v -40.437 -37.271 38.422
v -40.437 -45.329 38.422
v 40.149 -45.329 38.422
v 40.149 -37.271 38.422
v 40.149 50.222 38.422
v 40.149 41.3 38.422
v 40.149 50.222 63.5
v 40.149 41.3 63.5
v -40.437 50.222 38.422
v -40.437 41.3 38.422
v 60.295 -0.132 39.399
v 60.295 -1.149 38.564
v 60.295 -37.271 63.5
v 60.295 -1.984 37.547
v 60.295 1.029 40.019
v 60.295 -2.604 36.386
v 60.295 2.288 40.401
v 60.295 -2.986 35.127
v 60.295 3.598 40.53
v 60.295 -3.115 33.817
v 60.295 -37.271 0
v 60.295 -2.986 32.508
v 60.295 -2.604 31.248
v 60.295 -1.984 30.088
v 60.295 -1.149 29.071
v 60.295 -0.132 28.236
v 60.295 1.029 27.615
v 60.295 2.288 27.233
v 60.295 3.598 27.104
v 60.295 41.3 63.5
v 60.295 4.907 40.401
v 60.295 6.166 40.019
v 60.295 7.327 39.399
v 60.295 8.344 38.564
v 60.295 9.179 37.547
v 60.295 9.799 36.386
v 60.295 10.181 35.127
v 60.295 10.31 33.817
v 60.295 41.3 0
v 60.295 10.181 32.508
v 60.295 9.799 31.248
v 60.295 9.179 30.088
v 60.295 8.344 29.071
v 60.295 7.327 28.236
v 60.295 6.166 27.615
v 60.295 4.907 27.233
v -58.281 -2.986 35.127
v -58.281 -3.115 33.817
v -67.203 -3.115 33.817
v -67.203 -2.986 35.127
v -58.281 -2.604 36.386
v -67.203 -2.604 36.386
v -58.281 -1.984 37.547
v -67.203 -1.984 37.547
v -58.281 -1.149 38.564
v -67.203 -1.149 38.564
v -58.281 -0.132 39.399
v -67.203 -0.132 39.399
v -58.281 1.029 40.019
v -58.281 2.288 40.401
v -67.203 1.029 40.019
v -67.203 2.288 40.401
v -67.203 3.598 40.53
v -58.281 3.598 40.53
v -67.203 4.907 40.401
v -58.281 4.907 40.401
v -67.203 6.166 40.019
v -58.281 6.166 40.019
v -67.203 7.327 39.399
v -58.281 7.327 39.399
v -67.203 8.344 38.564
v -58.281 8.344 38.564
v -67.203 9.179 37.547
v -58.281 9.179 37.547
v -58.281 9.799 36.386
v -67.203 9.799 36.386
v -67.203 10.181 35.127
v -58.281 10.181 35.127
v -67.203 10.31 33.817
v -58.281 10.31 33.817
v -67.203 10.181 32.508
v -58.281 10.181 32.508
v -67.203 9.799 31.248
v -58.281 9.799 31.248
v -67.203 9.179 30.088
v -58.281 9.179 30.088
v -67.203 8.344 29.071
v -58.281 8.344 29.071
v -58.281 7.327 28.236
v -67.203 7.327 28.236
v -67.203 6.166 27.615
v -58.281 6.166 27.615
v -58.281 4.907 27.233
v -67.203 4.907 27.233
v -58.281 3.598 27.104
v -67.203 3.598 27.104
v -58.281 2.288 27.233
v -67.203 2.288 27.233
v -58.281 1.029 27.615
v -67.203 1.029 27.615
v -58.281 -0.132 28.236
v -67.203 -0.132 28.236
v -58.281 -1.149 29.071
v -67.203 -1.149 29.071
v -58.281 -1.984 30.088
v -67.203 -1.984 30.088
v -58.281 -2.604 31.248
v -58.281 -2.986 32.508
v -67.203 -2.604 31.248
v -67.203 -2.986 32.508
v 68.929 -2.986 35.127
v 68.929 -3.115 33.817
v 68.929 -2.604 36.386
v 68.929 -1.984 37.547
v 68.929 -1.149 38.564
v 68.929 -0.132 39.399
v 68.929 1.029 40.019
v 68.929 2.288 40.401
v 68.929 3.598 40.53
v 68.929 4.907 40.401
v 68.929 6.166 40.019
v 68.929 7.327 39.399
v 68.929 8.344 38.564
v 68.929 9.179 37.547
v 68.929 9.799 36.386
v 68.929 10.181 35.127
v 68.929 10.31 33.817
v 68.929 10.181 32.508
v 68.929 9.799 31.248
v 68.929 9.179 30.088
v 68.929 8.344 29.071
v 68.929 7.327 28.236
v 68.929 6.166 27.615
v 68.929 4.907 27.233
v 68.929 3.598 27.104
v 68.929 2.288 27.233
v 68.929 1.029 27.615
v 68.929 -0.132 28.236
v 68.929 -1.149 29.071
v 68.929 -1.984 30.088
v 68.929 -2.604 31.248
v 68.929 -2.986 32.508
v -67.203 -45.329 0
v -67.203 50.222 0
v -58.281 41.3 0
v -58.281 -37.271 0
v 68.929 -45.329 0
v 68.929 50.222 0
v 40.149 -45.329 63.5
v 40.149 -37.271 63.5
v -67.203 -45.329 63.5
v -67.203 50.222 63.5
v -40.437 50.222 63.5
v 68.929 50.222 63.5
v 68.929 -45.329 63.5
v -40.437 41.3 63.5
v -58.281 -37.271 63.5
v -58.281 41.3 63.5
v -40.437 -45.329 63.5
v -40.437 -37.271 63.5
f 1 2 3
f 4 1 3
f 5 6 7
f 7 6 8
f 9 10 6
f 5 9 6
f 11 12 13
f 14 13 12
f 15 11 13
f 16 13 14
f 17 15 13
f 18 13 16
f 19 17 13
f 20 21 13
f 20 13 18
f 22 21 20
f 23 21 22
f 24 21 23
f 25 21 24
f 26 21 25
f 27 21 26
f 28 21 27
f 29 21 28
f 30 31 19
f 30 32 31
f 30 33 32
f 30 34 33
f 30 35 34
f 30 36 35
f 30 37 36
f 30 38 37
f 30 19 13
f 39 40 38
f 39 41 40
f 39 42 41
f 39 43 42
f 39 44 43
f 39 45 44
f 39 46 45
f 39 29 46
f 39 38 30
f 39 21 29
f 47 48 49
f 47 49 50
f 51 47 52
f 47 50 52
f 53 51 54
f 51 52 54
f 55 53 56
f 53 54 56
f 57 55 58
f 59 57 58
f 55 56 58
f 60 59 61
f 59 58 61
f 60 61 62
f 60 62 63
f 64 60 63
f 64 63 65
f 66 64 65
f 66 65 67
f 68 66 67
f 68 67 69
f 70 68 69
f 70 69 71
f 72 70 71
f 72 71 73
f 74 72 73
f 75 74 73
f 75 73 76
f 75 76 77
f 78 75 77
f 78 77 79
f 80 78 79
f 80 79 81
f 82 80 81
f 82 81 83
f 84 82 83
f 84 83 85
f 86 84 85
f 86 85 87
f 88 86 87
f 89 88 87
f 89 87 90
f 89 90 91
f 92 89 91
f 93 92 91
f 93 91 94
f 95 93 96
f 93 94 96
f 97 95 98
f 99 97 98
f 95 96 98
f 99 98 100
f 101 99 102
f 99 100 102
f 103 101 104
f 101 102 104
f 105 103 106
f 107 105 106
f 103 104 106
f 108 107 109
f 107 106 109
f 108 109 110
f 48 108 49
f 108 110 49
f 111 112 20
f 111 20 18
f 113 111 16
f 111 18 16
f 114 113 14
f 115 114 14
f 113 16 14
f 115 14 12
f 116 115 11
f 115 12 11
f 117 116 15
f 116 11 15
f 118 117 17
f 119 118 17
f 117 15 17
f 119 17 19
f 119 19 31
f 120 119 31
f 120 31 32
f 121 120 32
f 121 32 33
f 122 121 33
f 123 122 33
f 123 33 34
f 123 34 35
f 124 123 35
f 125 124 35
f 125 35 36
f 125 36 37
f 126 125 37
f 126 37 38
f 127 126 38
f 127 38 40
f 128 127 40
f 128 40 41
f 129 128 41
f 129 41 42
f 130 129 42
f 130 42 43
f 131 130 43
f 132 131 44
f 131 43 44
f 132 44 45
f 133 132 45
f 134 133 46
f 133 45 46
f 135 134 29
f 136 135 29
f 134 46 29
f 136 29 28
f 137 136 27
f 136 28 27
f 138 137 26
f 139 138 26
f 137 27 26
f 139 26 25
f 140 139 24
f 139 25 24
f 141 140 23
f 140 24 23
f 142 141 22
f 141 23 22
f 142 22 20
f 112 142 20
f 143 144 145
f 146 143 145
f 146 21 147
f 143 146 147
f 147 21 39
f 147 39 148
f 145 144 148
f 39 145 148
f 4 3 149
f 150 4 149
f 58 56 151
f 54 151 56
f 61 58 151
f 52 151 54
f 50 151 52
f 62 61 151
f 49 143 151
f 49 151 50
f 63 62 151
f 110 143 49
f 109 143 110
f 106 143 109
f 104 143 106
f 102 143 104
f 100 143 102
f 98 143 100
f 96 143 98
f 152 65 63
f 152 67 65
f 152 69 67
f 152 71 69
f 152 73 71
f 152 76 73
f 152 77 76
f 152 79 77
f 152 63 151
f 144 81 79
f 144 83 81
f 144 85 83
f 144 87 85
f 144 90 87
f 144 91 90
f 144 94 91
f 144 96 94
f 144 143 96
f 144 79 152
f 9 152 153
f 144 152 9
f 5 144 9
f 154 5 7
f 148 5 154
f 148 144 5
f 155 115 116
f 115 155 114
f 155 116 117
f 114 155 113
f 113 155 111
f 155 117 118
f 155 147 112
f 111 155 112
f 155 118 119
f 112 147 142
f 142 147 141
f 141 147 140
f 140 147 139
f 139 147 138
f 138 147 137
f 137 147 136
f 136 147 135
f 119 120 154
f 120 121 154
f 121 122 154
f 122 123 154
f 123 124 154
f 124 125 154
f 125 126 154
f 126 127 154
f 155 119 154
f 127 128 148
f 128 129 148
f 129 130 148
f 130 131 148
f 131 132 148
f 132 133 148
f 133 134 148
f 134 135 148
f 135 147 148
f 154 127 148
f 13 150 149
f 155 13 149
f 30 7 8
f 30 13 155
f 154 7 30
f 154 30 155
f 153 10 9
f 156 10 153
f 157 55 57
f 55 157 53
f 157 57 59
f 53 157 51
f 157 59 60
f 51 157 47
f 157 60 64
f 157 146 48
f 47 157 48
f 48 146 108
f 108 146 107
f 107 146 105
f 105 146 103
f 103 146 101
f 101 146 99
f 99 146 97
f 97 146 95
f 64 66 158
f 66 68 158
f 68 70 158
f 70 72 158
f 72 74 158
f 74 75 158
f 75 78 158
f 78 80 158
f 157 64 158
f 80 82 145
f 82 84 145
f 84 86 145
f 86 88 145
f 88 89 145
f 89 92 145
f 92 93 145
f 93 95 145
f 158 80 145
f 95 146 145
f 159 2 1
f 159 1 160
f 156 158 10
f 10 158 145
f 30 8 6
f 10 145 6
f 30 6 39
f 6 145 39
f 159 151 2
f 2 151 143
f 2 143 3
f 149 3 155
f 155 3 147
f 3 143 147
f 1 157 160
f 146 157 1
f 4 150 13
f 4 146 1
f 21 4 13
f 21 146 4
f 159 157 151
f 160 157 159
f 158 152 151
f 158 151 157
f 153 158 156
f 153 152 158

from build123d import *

# Parameters (mm, degrees)
F0_W     = 136.1321210861
F0_H     = 95.5515094101
F0_W_2   = 118.5759752989
F0_H_2   = 78.5709768534
F1_DEPTH = 63.5
F2_W     = 80.5856101215
F2_H     = 25.0779332817
F3_DEPTH = 141.986
F4_R     = 6.7127269872
F5_DEPTH = 186.69


with BuildPart() as f1:
    # F0 (on Top) → F1 (new body)
    with BuildSketch(Plane.XY):
        with Locations((0.8634179831, 2.4463478476)):
            Rectangle(F0_W, F0_H)
        with Locations((1.007322222, 2.0146407187)):
            Rectangle(F0_W_2, F0_H_2, mode=Mode.SUBTRACT)
    extrude(amount=F1_DEPTH)

    # F2 (on face) → F3 (cut)
    with BuildSketch(Plane.XZ.offset(45.3294068575)):
        with Locations((-0.1439023763, 50.9610333592)):
            Rectangle(F2_W, F2_H)
    extrude(amount=-F3_DEPTH, mode=Mode.SUBTRACT)

    # F4 (on face) → F5 (cut)
    with BuildSketch(Plane(origin=(-67.20264256, 0, 0), x_dir=(0, -1, 0), z_dir=(-1, 0, 0))):
        with Locations((-3.597572213, 33.8171757758)):
            Circle(F4_R)
    extrude(amount=-F5_DEPTH, mode=Mode.SUBTRACT)


solid = f1.part
